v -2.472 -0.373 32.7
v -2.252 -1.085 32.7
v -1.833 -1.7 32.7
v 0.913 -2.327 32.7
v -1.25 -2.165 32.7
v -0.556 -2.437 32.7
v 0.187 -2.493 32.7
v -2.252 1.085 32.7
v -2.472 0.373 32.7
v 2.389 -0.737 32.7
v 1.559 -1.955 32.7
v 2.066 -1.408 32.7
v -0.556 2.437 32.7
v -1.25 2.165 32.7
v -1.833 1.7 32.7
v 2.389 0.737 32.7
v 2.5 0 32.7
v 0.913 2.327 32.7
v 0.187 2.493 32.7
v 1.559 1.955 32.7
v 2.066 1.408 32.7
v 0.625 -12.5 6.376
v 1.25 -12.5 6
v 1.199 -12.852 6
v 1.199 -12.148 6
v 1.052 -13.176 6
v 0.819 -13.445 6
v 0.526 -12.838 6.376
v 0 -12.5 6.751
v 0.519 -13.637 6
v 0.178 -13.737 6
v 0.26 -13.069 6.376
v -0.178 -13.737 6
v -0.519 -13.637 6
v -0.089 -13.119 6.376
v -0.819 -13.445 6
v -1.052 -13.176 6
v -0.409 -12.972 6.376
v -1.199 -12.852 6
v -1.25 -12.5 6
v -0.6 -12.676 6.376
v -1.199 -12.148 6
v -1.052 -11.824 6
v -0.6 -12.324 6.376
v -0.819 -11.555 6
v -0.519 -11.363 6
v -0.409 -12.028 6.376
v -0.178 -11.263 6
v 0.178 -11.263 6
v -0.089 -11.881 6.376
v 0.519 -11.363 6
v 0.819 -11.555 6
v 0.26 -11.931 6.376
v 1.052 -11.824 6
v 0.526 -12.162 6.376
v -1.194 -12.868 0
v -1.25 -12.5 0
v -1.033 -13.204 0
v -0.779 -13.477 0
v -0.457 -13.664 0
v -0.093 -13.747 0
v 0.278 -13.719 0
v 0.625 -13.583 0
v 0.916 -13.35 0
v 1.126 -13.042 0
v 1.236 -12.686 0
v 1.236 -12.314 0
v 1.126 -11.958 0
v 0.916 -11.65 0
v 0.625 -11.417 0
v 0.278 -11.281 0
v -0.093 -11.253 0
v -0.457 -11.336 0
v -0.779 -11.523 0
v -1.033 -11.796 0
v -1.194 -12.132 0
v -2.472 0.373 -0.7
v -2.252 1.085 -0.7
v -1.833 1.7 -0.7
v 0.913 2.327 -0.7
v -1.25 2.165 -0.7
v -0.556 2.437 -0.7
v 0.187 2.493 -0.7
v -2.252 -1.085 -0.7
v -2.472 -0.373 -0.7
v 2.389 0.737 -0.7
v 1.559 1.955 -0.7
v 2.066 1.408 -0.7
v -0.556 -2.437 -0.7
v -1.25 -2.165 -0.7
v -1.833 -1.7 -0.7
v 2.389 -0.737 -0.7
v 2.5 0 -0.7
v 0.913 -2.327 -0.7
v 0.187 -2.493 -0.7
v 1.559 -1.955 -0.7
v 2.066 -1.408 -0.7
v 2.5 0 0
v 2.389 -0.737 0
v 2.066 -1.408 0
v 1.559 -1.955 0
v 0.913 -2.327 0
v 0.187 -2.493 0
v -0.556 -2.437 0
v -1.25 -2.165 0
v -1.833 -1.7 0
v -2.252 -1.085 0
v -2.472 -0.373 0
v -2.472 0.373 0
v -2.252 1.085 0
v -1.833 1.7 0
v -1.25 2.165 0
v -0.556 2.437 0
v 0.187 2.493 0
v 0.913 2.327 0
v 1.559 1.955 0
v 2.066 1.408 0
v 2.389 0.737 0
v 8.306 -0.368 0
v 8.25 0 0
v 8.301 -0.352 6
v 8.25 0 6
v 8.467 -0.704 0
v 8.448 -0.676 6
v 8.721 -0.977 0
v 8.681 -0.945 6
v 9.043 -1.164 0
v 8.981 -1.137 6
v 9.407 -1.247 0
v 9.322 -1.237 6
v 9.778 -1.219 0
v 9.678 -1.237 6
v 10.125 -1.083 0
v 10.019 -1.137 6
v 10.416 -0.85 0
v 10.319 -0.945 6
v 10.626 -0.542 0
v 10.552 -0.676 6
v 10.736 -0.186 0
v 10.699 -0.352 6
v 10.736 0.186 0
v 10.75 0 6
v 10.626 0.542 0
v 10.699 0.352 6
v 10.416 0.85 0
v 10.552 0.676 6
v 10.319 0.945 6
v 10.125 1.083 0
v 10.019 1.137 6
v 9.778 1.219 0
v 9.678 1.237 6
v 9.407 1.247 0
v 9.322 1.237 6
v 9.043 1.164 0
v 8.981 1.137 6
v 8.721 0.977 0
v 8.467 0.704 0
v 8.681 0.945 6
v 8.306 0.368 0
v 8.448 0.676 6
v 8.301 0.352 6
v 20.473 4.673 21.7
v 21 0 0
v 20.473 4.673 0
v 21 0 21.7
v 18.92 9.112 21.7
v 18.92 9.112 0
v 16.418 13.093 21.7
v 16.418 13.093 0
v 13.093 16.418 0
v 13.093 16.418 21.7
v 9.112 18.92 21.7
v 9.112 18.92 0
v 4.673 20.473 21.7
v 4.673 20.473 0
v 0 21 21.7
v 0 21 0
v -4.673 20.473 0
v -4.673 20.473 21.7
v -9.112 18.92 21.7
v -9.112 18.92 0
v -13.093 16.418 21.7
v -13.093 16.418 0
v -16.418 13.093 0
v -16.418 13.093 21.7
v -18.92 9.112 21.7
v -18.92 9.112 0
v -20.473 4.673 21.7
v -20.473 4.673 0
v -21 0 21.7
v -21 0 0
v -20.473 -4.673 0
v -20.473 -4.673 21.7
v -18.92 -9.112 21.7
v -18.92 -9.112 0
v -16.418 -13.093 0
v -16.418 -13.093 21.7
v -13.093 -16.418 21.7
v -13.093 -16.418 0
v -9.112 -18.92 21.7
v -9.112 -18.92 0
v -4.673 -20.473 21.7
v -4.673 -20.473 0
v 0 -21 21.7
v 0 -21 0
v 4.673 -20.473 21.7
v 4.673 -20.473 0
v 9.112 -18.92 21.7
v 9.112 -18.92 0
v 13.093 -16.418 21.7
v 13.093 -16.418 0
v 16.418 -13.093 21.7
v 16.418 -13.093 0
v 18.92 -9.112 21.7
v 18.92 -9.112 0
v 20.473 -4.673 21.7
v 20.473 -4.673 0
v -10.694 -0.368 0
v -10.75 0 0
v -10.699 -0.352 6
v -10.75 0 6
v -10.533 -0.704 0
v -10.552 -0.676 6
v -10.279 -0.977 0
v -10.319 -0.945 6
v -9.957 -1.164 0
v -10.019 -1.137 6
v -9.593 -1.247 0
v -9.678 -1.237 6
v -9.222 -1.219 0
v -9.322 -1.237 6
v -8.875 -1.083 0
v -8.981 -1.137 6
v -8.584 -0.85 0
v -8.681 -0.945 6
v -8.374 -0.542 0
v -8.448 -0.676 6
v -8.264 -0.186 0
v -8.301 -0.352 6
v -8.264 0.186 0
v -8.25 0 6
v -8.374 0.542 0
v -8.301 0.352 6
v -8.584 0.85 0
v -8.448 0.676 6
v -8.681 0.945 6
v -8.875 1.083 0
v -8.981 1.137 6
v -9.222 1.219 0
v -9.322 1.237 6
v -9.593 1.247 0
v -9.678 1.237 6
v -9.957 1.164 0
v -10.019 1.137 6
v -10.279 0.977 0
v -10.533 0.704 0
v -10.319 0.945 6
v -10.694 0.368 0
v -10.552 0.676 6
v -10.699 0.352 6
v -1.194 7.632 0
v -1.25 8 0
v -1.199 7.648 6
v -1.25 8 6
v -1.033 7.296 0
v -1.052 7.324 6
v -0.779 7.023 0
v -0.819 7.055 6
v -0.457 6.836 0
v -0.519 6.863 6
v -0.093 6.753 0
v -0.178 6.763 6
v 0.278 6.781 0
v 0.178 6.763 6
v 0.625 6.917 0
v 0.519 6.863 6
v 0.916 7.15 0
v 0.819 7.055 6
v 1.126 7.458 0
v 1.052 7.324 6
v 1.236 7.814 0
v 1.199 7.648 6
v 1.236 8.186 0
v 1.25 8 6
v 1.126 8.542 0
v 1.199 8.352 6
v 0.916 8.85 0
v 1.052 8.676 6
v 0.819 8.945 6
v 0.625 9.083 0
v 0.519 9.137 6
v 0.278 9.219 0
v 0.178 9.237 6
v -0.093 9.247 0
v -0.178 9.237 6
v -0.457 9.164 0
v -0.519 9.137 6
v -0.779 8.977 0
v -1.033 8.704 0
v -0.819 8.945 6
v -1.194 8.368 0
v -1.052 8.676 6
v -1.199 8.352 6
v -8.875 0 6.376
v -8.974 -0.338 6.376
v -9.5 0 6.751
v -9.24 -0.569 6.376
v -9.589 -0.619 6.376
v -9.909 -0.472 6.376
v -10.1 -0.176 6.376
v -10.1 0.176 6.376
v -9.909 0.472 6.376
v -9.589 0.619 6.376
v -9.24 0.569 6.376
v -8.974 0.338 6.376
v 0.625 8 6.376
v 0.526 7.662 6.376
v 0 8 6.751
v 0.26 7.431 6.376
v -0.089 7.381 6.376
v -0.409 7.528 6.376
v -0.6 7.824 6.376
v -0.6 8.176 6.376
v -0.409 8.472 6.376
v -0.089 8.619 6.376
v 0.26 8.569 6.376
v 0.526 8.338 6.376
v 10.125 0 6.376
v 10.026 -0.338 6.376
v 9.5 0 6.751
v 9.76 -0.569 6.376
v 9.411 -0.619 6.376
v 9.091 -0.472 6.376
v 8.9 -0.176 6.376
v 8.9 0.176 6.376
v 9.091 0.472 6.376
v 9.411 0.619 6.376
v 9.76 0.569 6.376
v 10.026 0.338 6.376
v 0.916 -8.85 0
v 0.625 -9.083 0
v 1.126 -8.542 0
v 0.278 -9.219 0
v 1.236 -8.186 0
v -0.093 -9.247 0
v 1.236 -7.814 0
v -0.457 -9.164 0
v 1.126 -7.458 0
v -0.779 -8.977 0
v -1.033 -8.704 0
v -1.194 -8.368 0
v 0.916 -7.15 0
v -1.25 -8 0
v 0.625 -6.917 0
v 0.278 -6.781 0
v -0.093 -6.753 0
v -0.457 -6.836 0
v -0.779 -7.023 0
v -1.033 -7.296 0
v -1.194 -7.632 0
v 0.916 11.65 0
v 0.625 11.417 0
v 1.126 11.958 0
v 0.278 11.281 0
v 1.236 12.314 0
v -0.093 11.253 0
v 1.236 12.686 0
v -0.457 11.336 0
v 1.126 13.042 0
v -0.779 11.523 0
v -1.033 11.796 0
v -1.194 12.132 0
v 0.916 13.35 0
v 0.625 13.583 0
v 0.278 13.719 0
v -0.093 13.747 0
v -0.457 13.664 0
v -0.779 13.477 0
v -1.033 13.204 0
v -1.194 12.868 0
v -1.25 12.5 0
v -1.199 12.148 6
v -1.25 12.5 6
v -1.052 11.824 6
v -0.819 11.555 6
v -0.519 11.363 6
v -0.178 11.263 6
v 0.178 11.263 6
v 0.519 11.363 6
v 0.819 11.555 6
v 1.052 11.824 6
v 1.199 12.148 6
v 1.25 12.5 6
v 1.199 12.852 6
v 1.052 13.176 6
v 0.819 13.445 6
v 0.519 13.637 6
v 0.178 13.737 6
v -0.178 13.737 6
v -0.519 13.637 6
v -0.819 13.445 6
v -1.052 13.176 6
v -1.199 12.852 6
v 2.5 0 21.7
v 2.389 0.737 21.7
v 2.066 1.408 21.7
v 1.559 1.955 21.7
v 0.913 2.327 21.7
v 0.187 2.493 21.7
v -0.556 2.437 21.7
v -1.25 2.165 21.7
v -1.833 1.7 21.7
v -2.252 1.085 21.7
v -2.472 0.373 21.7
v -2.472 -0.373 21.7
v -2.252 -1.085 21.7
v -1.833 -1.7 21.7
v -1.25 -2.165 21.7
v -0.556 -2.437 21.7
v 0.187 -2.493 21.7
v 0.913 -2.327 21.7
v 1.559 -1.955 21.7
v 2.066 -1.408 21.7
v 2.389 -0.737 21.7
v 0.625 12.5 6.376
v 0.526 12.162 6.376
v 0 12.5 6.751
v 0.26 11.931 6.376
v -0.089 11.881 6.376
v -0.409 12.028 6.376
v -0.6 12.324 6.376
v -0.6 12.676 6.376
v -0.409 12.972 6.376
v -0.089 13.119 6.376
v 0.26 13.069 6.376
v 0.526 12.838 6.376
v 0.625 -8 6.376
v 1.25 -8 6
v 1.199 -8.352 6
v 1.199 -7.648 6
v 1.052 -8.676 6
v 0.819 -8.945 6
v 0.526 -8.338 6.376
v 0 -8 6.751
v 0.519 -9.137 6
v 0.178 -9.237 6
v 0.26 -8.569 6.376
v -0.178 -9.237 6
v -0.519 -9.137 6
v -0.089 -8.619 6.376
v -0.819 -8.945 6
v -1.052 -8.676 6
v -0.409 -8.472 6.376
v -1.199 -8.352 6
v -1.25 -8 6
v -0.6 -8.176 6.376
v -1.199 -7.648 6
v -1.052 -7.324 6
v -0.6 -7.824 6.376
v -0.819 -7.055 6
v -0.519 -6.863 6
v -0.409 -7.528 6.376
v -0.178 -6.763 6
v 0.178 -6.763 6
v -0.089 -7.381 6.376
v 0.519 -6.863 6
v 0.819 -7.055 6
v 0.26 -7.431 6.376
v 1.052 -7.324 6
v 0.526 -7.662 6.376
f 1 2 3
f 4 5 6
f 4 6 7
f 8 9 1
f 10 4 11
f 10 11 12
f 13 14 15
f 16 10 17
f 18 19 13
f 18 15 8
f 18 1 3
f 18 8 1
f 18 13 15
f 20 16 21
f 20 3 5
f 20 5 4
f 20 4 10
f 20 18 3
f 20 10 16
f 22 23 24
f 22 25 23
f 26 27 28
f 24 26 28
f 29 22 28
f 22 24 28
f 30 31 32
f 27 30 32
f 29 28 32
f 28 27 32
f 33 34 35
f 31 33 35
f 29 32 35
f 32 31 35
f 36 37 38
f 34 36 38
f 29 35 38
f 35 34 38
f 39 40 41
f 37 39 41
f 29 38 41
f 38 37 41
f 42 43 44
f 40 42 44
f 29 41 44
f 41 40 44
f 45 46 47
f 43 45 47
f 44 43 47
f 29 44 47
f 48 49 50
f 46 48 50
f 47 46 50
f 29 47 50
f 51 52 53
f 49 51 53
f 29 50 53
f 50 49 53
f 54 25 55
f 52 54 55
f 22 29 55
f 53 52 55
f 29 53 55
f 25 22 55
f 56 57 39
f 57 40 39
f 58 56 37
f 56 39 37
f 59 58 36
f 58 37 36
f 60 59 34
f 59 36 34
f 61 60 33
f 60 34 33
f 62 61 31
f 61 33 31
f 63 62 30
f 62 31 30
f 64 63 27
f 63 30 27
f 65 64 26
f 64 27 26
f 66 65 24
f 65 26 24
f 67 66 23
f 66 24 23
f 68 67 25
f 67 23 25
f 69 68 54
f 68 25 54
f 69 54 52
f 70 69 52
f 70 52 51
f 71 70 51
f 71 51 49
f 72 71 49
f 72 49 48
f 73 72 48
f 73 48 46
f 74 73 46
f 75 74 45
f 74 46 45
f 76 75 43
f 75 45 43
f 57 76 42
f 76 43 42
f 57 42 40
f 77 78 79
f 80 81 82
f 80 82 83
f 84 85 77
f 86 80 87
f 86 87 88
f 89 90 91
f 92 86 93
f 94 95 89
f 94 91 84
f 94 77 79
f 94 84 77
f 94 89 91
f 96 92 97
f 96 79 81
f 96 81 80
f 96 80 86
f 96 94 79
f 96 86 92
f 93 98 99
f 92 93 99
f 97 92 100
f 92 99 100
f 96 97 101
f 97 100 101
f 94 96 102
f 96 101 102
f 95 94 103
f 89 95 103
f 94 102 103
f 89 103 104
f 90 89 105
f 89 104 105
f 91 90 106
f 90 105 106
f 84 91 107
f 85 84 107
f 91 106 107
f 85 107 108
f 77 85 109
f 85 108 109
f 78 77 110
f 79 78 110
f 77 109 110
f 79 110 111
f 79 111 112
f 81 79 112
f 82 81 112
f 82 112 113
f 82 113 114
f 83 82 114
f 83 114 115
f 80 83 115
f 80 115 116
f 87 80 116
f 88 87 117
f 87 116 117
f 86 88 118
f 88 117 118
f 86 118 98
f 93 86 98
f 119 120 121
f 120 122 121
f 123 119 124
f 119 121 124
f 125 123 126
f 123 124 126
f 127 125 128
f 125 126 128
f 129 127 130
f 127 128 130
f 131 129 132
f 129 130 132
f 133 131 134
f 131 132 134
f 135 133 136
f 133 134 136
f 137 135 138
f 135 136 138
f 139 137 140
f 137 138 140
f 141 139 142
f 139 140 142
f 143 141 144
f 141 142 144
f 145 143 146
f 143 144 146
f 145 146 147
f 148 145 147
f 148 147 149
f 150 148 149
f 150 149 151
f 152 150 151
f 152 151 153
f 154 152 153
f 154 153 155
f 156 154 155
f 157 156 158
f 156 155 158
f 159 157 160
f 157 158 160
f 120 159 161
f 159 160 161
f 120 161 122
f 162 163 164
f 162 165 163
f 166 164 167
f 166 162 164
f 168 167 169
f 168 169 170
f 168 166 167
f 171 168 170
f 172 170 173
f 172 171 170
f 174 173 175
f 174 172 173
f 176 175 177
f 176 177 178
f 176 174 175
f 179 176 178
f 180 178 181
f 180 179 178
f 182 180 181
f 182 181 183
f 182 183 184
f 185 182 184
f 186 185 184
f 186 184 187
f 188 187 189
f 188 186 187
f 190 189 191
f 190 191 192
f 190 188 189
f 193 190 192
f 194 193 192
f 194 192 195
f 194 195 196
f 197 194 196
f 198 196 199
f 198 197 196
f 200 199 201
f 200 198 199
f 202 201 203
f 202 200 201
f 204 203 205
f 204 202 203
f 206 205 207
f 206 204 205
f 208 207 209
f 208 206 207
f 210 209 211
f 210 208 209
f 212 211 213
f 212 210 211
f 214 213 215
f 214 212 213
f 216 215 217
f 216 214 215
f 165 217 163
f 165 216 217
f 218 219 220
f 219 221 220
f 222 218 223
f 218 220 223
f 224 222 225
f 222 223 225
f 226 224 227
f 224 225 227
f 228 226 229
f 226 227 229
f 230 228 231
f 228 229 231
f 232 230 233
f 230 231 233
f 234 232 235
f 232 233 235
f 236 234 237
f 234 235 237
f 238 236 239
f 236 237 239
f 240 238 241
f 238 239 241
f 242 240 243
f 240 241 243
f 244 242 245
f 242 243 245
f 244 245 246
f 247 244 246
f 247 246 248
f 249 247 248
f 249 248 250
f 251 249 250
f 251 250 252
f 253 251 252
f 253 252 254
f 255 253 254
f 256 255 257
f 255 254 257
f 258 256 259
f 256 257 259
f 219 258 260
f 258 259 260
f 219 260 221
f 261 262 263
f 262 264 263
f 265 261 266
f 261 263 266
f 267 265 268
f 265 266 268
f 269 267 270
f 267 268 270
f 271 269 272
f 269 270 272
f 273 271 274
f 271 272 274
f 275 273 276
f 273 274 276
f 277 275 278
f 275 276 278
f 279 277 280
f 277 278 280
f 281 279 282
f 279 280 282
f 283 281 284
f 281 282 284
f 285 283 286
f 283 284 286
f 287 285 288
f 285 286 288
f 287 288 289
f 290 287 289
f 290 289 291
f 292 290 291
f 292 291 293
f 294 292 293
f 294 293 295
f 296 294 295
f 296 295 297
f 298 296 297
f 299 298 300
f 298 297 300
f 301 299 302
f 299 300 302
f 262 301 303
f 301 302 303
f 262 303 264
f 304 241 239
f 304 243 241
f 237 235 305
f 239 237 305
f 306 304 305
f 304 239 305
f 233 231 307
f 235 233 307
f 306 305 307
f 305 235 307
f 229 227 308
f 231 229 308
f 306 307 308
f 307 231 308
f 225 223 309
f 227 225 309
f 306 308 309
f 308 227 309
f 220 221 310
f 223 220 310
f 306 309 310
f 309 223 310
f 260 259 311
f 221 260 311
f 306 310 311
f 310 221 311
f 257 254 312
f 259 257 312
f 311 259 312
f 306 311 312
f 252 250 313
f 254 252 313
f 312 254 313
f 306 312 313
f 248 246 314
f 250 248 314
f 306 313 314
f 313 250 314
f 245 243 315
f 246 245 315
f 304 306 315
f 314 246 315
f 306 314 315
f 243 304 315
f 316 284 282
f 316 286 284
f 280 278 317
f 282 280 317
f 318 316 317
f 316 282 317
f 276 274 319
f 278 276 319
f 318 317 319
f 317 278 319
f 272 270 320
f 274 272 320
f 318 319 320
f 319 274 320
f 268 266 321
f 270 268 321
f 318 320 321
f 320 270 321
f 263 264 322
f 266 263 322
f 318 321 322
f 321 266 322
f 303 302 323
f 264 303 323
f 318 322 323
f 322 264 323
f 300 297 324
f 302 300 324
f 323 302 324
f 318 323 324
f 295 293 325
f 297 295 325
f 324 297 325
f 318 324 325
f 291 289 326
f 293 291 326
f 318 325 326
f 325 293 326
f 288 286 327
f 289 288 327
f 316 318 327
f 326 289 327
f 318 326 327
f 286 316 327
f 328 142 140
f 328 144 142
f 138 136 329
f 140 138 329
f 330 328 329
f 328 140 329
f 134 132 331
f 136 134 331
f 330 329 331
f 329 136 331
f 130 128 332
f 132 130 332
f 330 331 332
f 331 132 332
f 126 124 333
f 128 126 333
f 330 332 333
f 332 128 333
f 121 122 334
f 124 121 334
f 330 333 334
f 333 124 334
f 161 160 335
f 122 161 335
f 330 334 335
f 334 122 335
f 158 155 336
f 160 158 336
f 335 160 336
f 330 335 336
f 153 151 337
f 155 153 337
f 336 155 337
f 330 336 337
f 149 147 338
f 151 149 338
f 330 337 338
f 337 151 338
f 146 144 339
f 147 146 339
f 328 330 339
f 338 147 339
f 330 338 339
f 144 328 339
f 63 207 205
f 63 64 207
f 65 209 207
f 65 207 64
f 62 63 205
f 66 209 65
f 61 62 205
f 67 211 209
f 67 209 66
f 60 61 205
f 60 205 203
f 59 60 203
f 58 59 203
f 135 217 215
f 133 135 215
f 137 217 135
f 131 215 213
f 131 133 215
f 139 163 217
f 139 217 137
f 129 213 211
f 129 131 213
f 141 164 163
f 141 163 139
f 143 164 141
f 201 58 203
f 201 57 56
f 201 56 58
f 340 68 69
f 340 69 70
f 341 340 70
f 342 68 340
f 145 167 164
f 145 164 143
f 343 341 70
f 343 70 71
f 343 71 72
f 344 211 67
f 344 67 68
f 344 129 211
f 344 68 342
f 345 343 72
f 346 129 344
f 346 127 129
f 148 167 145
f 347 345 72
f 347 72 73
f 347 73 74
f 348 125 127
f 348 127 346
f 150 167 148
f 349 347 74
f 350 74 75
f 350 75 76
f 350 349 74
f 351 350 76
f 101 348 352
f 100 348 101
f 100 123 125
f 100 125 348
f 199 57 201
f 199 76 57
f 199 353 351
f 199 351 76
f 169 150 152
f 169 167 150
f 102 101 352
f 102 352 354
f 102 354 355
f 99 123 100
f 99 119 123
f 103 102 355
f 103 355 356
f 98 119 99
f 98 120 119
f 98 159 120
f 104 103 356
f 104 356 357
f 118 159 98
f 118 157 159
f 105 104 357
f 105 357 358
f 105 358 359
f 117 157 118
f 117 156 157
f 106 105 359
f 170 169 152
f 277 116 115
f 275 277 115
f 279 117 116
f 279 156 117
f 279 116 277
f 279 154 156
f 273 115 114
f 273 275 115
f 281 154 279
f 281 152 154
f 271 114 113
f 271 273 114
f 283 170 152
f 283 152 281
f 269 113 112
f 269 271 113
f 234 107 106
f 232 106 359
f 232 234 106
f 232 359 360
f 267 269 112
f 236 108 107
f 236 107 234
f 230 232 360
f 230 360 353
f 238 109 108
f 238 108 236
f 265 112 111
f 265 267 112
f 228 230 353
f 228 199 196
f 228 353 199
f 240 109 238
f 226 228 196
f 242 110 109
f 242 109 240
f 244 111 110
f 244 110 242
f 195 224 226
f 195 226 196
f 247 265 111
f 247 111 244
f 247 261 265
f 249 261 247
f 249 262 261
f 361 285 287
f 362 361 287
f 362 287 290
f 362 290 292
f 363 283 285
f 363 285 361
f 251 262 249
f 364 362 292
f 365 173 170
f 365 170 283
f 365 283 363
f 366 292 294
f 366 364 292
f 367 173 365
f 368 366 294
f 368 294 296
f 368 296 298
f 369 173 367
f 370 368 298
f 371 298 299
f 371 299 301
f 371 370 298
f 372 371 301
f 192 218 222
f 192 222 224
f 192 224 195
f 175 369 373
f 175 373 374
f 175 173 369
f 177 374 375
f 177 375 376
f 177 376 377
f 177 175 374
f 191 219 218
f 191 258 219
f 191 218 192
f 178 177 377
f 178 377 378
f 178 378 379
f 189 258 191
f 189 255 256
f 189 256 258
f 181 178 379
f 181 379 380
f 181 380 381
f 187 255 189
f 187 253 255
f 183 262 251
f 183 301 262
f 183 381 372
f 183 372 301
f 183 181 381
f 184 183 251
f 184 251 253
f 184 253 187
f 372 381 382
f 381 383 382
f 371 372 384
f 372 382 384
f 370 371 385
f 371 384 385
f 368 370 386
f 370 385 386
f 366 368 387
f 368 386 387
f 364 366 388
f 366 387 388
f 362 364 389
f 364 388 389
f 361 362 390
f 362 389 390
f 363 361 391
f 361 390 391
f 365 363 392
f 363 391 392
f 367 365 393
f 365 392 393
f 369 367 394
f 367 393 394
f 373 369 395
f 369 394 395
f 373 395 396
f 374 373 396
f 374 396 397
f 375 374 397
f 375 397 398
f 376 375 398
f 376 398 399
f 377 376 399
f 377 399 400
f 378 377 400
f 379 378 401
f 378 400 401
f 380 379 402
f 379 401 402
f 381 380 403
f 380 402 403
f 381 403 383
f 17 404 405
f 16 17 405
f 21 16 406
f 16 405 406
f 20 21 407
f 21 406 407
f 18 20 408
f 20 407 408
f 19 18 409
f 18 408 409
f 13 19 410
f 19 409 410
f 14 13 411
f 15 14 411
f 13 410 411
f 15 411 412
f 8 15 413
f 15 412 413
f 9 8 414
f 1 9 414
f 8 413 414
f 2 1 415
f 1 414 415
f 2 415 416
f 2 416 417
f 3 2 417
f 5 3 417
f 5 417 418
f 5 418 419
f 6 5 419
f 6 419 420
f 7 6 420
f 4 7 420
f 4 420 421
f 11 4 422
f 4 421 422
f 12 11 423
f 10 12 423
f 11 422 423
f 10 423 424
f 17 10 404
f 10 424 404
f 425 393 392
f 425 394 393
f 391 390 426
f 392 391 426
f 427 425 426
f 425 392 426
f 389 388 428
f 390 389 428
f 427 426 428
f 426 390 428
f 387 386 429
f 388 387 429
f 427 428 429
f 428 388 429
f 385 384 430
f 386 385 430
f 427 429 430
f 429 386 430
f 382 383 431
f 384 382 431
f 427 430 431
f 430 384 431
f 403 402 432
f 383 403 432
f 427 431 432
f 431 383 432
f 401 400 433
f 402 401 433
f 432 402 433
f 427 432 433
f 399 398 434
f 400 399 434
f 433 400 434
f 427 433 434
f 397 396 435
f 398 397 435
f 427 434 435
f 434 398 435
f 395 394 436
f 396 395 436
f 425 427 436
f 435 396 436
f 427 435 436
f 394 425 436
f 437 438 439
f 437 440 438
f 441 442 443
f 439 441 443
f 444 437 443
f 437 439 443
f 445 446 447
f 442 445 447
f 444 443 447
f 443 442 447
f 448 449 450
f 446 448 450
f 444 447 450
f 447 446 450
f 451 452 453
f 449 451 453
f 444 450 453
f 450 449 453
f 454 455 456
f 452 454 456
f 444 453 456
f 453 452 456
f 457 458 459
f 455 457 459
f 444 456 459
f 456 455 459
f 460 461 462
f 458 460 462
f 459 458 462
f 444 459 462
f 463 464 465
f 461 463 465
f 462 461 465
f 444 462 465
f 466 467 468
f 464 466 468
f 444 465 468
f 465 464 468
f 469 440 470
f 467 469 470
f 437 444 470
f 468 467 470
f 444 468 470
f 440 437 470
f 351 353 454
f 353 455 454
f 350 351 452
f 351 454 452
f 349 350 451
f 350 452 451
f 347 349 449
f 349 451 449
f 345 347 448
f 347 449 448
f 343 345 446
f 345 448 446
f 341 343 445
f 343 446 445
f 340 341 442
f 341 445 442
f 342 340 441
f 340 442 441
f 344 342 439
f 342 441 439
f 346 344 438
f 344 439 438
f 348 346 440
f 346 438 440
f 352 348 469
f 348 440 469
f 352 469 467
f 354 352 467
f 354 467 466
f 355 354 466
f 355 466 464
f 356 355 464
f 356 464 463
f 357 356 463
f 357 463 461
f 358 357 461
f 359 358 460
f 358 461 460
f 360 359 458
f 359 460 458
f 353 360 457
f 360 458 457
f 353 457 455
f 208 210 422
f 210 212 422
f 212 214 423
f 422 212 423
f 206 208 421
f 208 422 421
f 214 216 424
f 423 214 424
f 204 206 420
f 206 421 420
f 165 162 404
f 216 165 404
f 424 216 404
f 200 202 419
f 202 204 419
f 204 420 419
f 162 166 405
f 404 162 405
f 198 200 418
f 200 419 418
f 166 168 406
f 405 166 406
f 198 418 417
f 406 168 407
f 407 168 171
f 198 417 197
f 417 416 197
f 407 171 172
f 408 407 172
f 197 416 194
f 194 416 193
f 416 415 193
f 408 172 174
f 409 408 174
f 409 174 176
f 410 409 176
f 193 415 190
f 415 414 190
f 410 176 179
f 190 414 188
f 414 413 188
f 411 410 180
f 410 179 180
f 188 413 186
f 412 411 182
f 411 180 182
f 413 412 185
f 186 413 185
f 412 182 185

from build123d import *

# Parameters (mm, degrees)
F0_W     = 21
F0_H     = 21.7
F3_D     = 2.5
F3_DEPTH = 6
F3_TIP   = 0.7510757738
F4_R     = 2.5
F5_DEPTH = 11
F6_R     = 2.5
F7_DEPTH = 0.7


with BuildPart() as f1:
    # F0 (on Front) → F1 (revolve)
    with BuildSketch(Plane.XZ):
        with Locations((10.5, 10.85)):
            Rectangle(F0_W, F0_H)
    revolve(axis=Axis((0, 0, 10.85), (0, 0, 1)))

    # F3
    with Locations(Plane(origin=(0, 0, 0), x_dir=(1, 0, 0), z_dir=(0, 0, -1))):
        with Locations((0, 12.5), (0, 8), (-9.5, 0), (9.5, 0), (0, -8), (0, -12.5)):
            Hole(F3_D / 2, depth=F3_DEPTH)
            with Locations((0, 0, -(F3_DEPTH + F3_TIP / 2))):  # 118° drill point
                Cone(0, F3_D / 2, F3_TIP, mode=Mode.SUBTRACT)

    # F4 (on face) → F5 (join)
    with BuildSketch(Plane.XY.offset(21.7)):
        Circle(F4_R)
    extrude(amount=F5_DEPTH)

    # F6 (on face) → F7 (join)
    with BuildSketch(Plane(origin=(0, 0, 0), x_dir=(1, 0, 0), z_dir=(0, 0, -1))):
        Circle(F6_R)
    extrude(amount=F7_DEPTH)


solid = f1.part
